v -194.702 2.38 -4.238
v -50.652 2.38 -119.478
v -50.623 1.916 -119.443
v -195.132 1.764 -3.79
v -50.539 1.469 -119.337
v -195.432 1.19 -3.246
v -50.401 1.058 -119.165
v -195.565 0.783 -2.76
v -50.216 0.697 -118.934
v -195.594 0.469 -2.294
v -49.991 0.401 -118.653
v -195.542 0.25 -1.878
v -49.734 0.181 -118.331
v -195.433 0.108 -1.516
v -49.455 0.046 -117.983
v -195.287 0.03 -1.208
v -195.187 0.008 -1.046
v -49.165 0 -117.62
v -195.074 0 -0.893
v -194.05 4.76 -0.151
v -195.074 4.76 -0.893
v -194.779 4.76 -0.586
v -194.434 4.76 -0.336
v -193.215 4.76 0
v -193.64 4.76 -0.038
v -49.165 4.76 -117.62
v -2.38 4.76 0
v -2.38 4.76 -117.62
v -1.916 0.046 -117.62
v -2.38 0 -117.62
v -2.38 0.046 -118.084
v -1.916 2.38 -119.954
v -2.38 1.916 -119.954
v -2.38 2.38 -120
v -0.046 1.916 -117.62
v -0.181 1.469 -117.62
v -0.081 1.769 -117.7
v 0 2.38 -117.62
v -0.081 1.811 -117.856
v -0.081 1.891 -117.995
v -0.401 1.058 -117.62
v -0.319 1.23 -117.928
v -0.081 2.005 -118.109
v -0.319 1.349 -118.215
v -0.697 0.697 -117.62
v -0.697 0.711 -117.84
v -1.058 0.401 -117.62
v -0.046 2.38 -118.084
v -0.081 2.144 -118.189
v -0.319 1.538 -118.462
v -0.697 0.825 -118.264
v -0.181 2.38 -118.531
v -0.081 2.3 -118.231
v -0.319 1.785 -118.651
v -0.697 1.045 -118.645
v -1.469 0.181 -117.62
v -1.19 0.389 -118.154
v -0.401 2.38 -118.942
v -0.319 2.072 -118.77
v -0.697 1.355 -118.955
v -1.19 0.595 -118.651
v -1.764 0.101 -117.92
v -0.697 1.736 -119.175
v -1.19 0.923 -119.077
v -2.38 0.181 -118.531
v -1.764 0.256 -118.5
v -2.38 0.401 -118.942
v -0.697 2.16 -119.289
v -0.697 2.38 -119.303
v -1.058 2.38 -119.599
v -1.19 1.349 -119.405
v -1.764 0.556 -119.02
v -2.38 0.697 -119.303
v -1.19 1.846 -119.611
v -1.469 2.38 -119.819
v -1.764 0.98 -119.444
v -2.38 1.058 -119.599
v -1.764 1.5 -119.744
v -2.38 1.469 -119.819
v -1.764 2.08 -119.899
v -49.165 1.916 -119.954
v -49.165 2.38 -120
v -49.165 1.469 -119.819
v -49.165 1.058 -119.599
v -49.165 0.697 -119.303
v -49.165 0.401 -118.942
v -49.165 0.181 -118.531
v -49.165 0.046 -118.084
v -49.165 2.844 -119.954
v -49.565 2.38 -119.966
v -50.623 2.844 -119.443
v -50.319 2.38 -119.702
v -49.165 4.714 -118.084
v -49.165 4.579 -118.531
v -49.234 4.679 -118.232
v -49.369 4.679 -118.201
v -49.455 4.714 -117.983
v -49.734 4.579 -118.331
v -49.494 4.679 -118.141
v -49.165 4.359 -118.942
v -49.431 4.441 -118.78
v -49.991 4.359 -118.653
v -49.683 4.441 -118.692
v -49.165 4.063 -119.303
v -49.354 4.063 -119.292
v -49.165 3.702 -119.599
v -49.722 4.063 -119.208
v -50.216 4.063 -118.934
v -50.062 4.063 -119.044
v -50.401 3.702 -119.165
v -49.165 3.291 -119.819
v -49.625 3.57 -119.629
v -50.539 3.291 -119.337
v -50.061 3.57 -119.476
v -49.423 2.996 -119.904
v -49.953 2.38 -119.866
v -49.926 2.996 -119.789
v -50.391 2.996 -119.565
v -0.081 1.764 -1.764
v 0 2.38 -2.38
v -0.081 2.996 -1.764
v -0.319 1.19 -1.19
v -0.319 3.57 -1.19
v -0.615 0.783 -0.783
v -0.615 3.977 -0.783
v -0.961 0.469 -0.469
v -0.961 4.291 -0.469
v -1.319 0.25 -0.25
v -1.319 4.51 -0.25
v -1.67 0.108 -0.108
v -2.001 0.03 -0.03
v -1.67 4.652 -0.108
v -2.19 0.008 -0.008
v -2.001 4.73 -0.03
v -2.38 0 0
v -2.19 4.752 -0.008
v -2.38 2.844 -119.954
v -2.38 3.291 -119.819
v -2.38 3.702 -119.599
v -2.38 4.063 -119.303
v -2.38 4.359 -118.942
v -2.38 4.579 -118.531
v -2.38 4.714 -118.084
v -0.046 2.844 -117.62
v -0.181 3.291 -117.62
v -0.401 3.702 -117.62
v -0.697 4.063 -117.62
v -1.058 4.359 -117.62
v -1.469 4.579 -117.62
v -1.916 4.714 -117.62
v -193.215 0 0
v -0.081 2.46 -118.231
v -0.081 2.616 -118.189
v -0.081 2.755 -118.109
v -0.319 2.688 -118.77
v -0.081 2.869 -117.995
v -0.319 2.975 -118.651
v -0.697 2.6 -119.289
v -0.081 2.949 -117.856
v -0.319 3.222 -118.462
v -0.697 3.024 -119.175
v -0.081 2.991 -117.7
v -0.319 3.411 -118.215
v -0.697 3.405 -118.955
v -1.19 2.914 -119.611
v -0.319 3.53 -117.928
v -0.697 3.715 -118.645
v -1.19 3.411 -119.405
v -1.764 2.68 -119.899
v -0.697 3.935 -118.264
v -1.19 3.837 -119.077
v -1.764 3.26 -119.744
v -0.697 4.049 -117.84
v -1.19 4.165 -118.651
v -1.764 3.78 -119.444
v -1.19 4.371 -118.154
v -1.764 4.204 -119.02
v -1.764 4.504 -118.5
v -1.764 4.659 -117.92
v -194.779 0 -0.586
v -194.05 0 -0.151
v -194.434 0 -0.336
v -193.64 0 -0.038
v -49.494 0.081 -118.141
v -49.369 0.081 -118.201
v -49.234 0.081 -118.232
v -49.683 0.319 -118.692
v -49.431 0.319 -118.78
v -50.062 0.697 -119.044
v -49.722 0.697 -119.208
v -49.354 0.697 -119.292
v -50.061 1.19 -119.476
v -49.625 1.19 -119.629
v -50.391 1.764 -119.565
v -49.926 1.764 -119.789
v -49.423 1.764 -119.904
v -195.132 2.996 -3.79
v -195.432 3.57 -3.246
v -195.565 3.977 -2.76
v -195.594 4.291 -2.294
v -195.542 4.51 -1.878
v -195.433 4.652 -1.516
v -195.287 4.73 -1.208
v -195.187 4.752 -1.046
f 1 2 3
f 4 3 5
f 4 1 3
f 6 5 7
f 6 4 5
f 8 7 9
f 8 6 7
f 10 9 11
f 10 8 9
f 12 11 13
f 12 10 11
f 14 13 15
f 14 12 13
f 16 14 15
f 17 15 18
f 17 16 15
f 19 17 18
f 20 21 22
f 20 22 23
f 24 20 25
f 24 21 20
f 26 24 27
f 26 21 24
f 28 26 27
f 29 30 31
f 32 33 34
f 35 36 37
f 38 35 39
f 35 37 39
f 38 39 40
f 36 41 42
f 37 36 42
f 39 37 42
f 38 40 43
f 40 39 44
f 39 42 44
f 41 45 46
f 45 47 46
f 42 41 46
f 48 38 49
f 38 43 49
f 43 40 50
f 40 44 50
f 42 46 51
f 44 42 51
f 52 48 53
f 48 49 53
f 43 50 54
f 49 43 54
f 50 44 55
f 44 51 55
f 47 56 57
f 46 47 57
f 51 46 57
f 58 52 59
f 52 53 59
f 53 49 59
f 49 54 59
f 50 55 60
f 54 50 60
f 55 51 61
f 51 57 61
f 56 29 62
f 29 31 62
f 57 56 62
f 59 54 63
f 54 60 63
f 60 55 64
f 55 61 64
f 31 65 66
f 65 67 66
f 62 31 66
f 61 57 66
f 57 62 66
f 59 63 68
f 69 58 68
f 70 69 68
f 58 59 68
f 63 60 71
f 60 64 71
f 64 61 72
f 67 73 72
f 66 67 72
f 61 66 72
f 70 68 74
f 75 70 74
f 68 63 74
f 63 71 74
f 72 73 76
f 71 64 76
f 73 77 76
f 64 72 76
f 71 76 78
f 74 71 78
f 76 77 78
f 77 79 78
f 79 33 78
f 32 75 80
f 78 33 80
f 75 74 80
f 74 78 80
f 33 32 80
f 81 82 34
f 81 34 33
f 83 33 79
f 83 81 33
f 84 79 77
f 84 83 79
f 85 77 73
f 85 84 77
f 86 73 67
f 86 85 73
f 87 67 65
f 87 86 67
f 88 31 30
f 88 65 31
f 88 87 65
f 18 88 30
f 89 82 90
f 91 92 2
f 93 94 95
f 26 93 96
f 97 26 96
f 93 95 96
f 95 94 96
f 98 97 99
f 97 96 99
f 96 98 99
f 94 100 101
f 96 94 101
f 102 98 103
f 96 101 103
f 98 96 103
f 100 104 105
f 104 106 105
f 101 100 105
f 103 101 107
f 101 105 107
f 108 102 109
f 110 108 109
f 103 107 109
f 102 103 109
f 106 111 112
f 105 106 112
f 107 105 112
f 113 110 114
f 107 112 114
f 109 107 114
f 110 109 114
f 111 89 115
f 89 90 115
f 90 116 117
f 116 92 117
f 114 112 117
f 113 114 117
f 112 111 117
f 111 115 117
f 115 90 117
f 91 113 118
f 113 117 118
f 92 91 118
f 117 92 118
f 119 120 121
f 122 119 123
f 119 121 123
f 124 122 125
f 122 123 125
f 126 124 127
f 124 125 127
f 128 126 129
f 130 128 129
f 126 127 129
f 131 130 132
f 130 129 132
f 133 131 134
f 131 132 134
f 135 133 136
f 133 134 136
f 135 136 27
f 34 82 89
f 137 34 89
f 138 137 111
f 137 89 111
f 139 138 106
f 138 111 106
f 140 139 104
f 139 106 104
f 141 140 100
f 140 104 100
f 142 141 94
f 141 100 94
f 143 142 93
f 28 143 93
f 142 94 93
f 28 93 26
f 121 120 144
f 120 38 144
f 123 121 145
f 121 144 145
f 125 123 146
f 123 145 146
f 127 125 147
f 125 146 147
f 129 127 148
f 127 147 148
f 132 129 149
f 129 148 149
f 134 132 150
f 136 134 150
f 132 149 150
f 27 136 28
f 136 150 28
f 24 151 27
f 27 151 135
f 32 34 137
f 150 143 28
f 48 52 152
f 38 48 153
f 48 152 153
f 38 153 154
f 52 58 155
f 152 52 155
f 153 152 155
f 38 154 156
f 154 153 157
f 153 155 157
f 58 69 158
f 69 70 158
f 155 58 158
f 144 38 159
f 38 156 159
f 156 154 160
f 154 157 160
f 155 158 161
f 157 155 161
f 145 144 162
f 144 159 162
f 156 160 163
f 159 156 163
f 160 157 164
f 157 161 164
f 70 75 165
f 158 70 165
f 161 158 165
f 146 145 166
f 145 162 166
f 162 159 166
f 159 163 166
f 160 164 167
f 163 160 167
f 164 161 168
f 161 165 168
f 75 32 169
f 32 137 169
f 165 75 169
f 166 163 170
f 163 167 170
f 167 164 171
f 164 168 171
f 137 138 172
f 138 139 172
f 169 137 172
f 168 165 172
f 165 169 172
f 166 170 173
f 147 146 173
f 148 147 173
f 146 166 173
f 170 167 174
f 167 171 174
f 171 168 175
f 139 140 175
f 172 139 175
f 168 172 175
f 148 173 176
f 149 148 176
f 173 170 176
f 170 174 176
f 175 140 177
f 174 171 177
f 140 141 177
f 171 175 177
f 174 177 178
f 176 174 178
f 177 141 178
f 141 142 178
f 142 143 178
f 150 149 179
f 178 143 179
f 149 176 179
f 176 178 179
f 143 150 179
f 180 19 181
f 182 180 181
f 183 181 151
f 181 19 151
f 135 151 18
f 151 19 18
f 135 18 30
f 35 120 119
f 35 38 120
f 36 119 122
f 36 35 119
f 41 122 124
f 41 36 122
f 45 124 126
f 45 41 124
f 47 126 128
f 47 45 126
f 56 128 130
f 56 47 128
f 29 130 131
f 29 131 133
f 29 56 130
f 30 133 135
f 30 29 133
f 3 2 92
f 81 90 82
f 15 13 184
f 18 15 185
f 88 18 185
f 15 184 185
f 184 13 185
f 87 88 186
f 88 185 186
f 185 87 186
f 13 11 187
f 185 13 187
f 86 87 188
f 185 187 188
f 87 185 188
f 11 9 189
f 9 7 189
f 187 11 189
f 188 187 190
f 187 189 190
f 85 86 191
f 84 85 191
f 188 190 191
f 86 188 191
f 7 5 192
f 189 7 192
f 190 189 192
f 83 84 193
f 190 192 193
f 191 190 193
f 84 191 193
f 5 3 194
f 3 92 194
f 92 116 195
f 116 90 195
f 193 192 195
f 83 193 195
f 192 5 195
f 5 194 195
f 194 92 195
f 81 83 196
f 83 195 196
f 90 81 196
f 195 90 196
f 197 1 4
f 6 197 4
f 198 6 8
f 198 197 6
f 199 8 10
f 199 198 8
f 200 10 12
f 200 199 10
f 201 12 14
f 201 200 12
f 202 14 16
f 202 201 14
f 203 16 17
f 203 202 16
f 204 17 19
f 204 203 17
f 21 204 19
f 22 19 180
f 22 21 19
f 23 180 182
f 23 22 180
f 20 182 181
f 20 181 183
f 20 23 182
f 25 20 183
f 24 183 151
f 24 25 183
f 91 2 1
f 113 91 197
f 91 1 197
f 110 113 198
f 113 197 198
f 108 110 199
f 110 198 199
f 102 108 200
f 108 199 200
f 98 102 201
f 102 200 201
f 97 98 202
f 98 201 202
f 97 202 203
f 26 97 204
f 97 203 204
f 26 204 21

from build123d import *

# Parameters (mm, degrees)
BOSS_EXTRUDE1_DEPTH = 4.76
FILLET3_R           = 2.38


with BuildPart() as part:
    # Sketch1 → Boss-Extrude1 (new body)
    with BuildSketch(Plane(origin=(0, 0, 0), x_dir=(1, 0, 0), z_dir=(0, 1, 0))):
        Polygon((0, 0), (0, 120), (-50, 120), (-200, 0), align=None)
    extrude(amount=BOSS_EXTRUDE1_DEPTH)

    # Fillet3
    fillet3_edges = [part.edges().sort_by_distance(p)[0] for p in [
        (-25, 4.76, -120),
        (-125, 4.76, -60),
        (-125, 0, -60),
        (-25, 0, -120),
        (0, 0, -60),
        (-200, 2.38, 0),
        (-50, 2.38, -120),
        (0, 2.38, -120),
        (0, 2.38, 0),
        (0, 4.76, -60),
    ]]
    fillet(fillet3_edges, radius=FILLET3_R - 0.0001)  # a hair under: the kernel refuses the full size


solid = part.part
